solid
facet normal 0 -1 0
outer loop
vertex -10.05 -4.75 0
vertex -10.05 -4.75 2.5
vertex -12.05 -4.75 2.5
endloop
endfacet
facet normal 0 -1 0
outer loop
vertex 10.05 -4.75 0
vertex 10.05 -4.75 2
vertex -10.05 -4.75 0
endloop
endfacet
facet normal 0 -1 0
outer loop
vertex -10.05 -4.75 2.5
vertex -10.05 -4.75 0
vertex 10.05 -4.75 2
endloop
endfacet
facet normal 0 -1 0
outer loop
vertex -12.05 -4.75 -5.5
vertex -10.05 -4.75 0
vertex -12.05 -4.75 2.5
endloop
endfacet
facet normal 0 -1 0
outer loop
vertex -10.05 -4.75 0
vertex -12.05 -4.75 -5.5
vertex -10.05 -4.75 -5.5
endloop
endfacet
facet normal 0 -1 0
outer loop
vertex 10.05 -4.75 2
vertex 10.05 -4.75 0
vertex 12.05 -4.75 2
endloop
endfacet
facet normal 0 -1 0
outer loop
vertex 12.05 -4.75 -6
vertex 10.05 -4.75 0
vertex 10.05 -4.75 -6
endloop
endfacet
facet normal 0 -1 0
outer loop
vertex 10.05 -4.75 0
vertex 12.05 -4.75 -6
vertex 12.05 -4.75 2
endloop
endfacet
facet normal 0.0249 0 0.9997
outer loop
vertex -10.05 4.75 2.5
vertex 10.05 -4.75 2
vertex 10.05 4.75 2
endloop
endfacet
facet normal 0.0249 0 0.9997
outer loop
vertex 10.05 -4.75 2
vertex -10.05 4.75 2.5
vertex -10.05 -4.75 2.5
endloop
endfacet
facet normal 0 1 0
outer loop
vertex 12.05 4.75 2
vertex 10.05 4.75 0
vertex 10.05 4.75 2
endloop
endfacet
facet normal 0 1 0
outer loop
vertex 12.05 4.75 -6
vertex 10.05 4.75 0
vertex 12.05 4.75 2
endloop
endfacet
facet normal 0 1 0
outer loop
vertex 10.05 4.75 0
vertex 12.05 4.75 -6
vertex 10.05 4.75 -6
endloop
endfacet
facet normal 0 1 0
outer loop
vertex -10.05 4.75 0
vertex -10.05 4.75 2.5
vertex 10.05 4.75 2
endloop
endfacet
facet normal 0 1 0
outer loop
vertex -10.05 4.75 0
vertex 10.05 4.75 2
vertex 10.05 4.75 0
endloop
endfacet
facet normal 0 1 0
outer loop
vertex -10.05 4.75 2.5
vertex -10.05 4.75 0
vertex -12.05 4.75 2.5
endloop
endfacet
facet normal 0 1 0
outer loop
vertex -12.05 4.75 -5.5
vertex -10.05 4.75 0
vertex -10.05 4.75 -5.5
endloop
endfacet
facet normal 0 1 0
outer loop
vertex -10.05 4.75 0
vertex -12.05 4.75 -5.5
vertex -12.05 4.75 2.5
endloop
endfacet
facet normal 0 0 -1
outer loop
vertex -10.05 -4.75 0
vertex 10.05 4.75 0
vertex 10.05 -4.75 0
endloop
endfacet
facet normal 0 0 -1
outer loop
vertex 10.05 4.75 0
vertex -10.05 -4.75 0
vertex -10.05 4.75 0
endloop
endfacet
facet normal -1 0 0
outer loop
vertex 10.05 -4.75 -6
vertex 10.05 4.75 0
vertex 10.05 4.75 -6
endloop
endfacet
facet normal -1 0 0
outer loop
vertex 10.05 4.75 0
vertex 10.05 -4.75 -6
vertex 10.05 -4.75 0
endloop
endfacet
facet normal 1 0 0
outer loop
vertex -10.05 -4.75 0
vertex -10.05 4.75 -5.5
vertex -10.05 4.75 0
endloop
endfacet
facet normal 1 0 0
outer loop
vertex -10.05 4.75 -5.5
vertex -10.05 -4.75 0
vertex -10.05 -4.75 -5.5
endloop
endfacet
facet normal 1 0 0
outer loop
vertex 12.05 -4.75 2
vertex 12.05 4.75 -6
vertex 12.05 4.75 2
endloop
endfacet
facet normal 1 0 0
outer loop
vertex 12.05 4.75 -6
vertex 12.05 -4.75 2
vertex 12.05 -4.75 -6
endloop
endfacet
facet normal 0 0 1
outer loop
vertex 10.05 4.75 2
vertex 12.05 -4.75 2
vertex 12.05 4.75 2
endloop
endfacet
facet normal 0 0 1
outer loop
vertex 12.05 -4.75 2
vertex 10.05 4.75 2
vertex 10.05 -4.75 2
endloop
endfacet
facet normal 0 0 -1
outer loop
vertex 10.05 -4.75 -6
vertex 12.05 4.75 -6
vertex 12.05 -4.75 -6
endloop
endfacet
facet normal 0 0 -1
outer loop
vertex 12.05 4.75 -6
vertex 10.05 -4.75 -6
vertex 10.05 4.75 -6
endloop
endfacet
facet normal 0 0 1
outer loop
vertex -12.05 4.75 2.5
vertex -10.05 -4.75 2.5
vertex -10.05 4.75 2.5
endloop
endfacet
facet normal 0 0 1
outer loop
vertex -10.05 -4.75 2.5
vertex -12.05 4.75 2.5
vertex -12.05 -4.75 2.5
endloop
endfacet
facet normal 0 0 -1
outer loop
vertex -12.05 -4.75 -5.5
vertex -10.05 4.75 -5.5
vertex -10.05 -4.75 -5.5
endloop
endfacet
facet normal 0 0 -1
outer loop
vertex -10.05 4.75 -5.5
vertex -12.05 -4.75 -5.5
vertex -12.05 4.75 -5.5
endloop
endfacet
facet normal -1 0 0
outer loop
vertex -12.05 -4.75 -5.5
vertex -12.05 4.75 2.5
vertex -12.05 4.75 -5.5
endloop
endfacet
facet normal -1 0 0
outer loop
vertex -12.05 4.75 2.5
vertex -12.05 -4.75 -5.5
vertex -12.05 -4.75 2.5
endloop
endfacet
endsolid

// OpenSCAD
height=20.1;
wedge_z1 = 0;
wedge_z2 = 2.5;
wedge_z3 = 2;
wedge_y = 10-0.5;
foot_z = 8;

module wedge() {
    polyhedron(
        points=[
                [-height/2,-wedge_y/2, wedge_z1],
                [-height/2,-wedge_y/2, wedge_z2],
                [height/2,-wedge_y/2, wedge_z3],
                [height/2,-wedge_y/2, wedge_z1],
                [-height/2,wedge_y/2, wedge_z1],
                [-height/2,wedge_y/2, wedge_z2],
                [height/2,wedge_y/2, wedge_z3],
                [height/2,wedge_y/2, wedge_z1],
              ],
        faces =[
                [0,3,2,1],
                [1,2,6,5],
                [5,6,7,4],
                [4,7,3,0],
                [6,2,3,7],
                [0,1,5,4],
            
    ]);
}

wedge();
translate([height/2, -wedge_y/2, -foot_z + wedge_z3]) cube([2, wedge_y, foot_z]);
translate([-height/2-2, -wedge_y/2, -foot_z + wedge_z2]) cube([2, wedge_y, foot_z]);
